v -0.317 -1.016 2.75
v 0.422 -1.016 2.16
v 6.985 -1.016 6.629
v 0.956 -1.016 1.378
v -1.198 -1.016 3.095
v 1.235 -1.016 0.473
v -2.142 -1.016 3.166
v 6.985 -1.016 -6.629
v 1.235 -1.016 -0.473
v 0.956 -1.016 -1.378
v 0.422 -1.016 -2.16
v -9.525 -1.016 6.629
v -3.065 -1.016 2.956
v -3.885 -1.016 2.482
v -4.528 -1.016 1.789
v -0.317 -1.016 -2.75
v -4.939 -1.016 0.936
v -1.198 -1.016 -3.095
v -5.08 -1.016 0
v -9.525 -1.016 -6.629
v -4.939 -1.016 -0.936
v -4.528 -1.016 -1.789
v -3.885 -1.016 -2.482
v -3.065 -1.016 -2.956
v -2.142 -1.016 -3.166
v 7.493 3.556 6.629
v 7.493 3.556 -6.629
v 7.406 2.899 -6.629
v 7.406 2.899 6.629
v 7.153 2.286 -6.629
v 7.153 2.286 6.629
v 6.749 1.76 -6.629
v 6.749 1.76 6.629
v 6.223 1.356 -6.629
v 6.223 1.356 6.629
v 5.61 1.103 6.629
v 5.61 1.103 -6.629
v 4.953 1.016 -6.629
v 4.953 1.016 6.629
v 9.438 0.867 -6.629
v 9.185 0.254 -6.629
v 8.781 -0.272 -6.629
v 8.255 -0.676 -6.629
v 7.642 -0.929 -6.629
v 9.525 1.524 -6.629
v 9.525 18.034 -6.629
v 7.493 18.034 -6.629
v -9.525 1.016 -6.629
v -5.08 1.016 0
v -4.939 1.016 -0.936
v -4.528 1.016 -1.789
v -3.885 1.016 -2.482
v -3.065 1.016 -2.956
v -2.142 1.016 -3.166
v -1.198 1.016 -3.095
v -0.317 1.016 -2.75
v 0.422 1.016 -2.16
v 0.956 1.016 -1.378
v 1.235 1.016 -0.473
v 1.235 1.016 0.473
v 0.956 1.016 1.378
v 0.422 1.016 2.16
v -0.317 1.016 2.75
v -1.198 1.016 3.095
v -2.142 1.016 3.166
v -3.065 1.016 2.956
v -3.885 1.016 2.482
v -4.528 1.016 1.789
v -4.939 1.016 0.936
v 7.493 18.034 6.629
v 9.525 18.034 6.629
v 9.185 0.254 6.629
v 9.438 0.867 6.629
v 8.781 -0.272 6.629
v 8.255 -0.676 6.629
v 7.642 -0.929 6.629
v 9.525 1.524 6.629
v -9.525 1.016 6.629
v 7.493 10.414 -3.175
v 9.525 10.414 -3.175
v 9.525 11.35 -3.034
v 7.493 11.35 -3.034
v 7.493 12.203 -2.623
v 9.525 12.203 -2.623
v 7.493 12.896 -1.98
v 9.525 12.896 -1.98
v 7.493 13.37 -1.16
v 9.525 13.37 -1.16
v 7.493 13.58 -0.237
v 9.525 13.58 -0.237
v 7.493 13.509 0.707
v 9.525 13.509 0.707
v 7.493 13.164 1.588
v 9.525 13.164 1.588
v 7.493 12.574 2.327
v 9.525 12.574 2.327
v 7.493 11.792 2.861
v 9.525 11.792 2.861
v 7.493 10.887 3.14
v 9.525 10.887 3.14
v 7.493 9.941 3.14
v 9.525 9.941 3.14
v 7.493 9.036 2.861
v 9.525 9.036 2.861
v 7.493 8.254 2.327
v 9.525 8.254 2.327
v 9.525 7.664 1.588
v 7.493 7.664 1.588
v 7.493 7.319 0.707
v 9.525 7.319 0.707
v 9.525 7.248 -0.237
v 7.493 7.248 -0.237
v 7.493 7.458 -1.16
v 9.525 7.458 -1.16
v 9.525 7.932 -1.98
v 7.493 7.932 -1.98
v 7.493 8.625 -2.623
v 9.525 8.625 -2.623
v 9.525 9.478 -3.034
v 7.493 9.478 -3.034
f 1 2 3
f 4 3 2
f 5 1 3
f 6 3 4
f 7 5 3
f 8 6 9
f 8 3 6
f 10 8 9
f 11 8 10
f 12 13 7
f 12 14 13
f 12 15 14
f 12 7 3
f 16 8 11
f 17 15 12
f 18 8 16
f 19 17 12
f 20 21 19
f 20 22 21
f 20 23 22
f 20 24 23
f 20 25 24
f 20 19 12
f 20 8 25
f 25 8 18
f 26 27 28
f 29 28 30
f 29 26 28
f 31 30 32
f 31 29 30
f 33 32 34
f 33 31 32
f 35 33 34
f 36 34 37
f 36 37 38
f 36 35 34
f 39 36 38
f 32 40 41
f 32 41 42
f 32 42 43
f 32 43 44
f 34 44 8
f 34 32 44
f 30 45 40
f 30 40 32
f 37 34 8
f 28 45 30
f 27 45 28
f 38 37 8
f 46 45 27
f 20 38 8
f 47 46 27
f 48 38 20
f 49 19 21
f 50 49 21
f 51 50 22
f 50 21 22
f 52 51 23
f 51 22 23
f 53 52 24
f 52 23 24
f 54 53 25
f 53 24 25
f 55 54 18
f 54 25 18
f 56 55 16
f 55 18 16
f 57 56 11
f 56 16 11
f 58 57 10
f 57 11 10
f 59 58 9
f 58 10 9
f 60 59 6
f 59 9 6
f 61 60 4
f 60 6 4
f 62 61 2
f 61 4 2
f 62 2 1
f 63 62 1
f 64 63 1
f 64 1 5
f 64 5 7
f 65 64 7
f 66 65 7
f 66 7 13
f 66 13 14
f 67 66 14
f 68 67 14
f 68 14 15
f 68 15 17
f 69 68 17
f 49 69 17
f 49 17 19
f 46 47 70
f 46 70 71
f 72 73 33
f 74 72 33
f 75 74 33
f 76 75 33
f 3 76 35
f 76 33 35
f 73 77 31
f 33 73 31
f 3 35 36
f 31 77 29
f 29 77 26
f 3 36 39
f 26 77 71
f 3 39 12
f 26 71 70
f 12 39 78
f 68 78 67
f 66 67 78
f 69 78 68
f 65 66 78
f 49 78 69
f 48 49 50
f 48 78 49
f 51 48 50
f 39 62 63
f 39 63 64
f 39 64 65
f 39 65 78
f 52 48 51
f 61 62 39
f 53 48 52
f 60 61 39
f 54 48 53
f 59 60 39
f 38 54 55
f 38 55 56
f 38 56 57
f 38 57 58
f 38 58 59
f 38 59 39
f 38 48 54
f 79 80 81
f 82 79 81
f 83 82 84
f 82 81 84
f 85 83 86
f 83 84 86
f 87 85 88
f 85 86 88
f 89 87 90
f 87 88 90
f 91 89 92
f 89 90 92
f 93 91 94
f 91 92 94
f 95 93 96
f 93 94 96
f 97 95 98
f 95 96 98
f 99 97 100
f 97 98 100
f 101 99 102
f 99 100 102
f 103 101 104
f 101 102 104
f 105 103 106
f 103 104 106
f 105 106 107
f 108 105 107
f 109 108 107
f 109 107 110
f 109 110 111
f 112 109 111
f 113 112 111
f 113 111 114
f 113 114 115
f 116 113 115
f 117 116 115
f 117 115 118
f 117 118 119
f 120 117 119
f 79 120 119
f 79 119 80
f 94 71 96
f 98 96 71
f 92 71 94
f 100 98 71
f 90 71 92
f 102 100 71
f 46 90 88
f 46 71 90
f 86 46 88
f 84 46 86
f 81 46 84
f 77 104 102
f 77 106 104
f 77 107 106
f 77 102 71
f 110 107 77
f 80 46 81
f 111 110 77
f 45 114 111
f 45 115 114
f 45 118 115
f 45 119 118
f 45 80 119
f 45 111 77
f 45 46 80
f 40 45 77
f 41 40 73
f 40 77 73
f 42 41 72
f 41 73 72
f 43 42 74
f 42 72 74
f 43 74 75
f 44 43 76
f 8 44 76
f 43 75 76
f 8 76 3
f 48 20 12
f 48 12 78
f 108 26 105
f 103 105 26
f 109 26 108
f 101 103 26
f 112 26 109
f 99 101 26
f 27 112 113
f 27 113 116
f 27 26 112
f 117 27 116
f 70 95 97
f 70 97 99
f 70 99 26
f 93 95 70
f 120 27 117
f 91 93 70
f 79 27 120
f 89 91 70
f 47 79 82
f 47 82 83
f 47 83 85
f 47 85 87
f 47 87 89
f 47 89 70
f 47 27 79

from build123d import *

# Parameters (mm, degrees)
BOSS_EXTRUDE1_DEPTH        = 6.6294
BOSS_EXTRUDE1_DEPTH_BACK   = 6.6294
F_1_4_0_2500_DOWEL_HOLE1_D = 6.35
F_1_4_0_2500_DOWEL_HOLE2_D = 6.35
FILLET1_R                  = 2.54


with BuildPart() as part:
    # Sketch1 → Boss-Extrude1 (new, two sides: drawn at the far end of the back side and taken through both)
    with BuildSketch(Plane.XY.offset(-BOSS_EXTRUDE1_DEPTH_BACK)):
        Polygon((7.493, 1.016), (7.493, 18.034), (9.525, 18.034), (9.525, -1.016), (-9.525, -1.016), (-9.525, 1.016), align=None)
    extrude(amount=BOSS_EXTRUDE1_DEPTH + BOSS_EXTRUDE1_DEPTH_BACK)

    # 1/4 (0.2500) Dowel Hole1 (through all)
    with Locations(Plane(origin=(0, 1.016, 0), x_dir=(1, 0, 0), z_dir=(0, 1, 0))):
        with Locations((-1.905, 0)):
            Hole(F_1_4_0_2500_DOWEL_HOLE1_D / 2)

    # 1/4 (0.2500) Dowel Hole2 (through all)
    with Locations(Plane.ZY.offset(-7.493)):
        with Locations((0, 10.414)):
            Hole(F_1_4_0_2500_DOWEL_HOLE2_D / 2)

    # Fillet1
    fillet1_edges = [part.edges().sort_by_distance(p)[0] for p in [
        (7.493, 1.016, 0),
        (9.525, -1.016, 0),
    ]]
    fillet(fillet1_edges, radius=FILLET1_R)


solid = part.part
